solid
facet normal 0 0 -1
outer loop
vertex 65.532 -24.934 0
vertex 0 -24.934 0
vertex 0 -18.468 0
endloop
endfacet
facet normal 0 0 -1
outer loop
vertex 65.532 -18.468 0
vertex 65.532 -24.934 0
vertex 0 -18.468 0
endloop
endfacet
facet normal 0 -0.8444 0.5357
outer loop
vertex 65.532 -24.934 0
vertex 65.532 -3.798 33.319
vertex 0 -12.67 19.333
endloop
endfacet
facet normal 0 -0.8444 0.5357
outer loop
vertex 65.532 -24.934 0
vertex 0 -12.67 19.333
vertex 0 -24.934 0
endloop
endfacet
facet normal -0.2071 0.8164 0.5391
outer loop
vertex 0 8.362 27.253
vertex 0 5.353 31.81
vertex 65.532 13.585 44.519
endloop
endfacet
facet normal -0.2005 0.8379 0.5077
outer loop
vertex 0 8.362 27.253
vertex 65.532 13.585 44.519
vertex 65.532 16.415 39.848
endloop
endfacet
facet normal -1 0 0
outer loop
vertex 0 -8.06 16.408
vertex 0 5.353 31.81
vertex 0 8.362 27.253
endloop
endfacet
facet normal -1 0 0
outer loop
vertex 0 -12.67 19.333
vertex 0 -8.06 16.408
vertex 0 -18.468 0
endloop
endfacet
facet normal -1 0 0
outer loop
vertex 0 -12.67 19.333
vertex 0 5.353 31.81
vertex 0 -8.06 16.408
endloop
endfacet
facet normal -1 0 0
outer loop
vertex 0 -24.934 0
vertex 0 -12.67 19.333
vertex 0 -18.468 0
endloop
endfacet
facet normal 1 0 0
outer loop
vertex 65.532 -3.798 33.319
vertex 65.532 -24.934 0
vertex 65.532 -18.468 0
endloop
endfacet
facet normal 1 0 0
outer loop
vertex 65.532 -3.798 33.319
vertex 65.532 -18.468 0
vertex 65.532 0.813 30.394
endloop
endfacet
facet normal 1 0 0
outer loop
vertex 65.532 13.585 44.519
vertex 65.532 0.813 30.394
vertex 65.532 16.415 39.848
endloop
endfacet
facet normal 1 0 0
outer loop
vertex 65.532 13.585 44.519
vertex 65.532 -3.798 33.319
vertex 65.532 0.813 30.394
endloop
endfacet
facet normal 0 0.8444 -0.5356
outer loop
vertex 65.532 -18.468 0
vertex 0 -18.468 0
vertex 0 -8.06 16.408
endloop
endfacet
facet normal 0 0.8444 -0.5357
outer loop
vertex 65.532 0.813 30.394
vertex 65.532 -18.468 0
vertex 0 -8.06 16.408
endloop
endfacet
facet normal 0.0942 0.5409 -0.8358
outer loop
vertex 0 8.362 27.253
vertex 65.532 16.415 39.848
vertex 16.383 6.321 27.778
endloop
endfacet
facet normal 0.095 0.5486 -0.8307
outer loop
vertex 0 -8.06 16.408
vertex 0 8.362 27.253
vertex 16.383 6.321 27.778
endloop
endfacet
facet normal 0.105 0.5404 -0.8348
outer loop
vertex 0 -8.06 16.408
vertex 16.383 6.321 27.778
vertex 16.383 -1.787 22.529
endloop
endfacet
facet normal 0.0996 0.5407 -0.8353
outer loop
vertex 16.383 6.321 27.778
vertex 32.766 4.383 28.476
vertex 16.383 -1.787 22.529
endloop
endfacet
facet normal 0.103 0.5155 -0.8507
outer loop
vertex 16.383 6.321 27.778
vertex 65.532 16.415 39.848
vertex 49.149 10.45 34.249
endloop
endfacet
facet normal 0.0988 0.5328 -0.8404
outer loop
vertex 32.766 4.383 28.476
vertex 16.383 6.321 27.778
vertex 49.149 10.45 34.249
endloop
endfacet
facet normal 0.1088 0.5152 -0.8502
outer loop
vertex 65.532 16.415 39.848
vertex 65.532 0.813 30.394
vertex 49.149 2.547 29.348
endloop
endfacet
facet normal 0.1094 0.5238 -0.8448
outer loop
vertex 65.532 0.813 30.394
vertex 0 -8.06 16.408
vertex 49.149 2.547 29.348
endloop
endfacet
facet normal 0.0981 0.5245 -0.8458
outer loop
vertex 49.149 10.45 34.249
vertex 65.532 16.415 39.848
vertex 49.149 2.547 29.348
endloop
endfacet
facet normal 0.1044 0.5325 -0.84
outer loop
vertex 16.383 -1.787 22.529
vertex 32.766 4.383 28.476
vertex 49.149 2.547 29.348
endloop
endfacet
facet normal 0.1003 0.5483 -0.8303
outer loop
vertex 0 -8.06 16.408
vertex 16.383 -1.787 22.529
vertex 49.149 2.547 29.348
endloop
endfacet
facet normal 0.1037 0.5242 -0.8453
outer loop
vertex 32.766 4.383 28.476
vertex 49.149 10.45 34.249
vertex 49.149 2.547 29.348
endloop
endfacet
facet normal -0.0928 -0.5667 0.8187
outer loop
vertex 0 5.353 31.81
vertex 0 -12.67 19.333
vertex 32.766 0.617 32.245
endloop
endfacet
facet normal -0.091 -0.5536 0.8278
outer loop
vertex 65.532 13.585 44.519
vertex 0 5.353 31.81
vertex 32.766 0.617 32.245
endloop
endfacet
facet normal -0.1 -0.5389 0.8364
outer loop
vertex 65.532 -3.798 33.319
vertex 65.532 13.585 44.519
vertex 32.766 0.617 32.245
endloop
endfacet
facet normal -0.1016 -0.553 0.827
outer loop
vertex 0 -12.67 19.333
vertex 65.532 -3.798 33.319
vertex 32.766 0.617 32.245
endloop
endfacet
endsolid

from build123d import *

# Parameters (mm, degrees)
F1_DEPTH = 65.532
F3_DEPTH = 25.4


with BuildPart() as f1:
    # F0 (on Right) → F1 (new body)
    with BuildSketch(Plane.YZ):
        Polygon((9.926255, 54.951947), (-24.934381, 0), (-18.468346, 0), (14.536806, 52.027088), align=None)
    extrude(amount=F1_DEPTH)

    # F2 (on face) → F3 (cut)
    with BuildSketch(Plane(origin=(0, -17.779247, 11.27887), x_dir=(1, 0, 0), z_dir=(0, -0.844418, 0.535685))):
        Polygon((-17.95695, 38.16301), (0, 9.537645), (65.532, 26.100498), (82.354724, 60.764659), (0, 74.19014), align=None)
    extrude(amount=-F3_DEPTH, mode=Mode.SUBTRACT)

    # F5 (on face) → F6 section 0
    with BuildSketch(Plane(origin=(0, 0, 0), x_dir=(0, -1, 0), z_dir=(-1, 0, 0))):
        Polygon((-8.362336, 27.253337), (8.059522, 16.407767), (12.670072, 19.332627), (-5.352806, 31.810228), align=None)
    # F4 (on face) → F6 section 1
    with BuildSketch(Plane.YZ.offset(65.532)):
        Polygon((-3.797598, 33.318595), (0.812953, 30.393735), (16.414955, 39.848458), (13.584736, 44.518831), align=None)
    loft()


solid = f1.part
